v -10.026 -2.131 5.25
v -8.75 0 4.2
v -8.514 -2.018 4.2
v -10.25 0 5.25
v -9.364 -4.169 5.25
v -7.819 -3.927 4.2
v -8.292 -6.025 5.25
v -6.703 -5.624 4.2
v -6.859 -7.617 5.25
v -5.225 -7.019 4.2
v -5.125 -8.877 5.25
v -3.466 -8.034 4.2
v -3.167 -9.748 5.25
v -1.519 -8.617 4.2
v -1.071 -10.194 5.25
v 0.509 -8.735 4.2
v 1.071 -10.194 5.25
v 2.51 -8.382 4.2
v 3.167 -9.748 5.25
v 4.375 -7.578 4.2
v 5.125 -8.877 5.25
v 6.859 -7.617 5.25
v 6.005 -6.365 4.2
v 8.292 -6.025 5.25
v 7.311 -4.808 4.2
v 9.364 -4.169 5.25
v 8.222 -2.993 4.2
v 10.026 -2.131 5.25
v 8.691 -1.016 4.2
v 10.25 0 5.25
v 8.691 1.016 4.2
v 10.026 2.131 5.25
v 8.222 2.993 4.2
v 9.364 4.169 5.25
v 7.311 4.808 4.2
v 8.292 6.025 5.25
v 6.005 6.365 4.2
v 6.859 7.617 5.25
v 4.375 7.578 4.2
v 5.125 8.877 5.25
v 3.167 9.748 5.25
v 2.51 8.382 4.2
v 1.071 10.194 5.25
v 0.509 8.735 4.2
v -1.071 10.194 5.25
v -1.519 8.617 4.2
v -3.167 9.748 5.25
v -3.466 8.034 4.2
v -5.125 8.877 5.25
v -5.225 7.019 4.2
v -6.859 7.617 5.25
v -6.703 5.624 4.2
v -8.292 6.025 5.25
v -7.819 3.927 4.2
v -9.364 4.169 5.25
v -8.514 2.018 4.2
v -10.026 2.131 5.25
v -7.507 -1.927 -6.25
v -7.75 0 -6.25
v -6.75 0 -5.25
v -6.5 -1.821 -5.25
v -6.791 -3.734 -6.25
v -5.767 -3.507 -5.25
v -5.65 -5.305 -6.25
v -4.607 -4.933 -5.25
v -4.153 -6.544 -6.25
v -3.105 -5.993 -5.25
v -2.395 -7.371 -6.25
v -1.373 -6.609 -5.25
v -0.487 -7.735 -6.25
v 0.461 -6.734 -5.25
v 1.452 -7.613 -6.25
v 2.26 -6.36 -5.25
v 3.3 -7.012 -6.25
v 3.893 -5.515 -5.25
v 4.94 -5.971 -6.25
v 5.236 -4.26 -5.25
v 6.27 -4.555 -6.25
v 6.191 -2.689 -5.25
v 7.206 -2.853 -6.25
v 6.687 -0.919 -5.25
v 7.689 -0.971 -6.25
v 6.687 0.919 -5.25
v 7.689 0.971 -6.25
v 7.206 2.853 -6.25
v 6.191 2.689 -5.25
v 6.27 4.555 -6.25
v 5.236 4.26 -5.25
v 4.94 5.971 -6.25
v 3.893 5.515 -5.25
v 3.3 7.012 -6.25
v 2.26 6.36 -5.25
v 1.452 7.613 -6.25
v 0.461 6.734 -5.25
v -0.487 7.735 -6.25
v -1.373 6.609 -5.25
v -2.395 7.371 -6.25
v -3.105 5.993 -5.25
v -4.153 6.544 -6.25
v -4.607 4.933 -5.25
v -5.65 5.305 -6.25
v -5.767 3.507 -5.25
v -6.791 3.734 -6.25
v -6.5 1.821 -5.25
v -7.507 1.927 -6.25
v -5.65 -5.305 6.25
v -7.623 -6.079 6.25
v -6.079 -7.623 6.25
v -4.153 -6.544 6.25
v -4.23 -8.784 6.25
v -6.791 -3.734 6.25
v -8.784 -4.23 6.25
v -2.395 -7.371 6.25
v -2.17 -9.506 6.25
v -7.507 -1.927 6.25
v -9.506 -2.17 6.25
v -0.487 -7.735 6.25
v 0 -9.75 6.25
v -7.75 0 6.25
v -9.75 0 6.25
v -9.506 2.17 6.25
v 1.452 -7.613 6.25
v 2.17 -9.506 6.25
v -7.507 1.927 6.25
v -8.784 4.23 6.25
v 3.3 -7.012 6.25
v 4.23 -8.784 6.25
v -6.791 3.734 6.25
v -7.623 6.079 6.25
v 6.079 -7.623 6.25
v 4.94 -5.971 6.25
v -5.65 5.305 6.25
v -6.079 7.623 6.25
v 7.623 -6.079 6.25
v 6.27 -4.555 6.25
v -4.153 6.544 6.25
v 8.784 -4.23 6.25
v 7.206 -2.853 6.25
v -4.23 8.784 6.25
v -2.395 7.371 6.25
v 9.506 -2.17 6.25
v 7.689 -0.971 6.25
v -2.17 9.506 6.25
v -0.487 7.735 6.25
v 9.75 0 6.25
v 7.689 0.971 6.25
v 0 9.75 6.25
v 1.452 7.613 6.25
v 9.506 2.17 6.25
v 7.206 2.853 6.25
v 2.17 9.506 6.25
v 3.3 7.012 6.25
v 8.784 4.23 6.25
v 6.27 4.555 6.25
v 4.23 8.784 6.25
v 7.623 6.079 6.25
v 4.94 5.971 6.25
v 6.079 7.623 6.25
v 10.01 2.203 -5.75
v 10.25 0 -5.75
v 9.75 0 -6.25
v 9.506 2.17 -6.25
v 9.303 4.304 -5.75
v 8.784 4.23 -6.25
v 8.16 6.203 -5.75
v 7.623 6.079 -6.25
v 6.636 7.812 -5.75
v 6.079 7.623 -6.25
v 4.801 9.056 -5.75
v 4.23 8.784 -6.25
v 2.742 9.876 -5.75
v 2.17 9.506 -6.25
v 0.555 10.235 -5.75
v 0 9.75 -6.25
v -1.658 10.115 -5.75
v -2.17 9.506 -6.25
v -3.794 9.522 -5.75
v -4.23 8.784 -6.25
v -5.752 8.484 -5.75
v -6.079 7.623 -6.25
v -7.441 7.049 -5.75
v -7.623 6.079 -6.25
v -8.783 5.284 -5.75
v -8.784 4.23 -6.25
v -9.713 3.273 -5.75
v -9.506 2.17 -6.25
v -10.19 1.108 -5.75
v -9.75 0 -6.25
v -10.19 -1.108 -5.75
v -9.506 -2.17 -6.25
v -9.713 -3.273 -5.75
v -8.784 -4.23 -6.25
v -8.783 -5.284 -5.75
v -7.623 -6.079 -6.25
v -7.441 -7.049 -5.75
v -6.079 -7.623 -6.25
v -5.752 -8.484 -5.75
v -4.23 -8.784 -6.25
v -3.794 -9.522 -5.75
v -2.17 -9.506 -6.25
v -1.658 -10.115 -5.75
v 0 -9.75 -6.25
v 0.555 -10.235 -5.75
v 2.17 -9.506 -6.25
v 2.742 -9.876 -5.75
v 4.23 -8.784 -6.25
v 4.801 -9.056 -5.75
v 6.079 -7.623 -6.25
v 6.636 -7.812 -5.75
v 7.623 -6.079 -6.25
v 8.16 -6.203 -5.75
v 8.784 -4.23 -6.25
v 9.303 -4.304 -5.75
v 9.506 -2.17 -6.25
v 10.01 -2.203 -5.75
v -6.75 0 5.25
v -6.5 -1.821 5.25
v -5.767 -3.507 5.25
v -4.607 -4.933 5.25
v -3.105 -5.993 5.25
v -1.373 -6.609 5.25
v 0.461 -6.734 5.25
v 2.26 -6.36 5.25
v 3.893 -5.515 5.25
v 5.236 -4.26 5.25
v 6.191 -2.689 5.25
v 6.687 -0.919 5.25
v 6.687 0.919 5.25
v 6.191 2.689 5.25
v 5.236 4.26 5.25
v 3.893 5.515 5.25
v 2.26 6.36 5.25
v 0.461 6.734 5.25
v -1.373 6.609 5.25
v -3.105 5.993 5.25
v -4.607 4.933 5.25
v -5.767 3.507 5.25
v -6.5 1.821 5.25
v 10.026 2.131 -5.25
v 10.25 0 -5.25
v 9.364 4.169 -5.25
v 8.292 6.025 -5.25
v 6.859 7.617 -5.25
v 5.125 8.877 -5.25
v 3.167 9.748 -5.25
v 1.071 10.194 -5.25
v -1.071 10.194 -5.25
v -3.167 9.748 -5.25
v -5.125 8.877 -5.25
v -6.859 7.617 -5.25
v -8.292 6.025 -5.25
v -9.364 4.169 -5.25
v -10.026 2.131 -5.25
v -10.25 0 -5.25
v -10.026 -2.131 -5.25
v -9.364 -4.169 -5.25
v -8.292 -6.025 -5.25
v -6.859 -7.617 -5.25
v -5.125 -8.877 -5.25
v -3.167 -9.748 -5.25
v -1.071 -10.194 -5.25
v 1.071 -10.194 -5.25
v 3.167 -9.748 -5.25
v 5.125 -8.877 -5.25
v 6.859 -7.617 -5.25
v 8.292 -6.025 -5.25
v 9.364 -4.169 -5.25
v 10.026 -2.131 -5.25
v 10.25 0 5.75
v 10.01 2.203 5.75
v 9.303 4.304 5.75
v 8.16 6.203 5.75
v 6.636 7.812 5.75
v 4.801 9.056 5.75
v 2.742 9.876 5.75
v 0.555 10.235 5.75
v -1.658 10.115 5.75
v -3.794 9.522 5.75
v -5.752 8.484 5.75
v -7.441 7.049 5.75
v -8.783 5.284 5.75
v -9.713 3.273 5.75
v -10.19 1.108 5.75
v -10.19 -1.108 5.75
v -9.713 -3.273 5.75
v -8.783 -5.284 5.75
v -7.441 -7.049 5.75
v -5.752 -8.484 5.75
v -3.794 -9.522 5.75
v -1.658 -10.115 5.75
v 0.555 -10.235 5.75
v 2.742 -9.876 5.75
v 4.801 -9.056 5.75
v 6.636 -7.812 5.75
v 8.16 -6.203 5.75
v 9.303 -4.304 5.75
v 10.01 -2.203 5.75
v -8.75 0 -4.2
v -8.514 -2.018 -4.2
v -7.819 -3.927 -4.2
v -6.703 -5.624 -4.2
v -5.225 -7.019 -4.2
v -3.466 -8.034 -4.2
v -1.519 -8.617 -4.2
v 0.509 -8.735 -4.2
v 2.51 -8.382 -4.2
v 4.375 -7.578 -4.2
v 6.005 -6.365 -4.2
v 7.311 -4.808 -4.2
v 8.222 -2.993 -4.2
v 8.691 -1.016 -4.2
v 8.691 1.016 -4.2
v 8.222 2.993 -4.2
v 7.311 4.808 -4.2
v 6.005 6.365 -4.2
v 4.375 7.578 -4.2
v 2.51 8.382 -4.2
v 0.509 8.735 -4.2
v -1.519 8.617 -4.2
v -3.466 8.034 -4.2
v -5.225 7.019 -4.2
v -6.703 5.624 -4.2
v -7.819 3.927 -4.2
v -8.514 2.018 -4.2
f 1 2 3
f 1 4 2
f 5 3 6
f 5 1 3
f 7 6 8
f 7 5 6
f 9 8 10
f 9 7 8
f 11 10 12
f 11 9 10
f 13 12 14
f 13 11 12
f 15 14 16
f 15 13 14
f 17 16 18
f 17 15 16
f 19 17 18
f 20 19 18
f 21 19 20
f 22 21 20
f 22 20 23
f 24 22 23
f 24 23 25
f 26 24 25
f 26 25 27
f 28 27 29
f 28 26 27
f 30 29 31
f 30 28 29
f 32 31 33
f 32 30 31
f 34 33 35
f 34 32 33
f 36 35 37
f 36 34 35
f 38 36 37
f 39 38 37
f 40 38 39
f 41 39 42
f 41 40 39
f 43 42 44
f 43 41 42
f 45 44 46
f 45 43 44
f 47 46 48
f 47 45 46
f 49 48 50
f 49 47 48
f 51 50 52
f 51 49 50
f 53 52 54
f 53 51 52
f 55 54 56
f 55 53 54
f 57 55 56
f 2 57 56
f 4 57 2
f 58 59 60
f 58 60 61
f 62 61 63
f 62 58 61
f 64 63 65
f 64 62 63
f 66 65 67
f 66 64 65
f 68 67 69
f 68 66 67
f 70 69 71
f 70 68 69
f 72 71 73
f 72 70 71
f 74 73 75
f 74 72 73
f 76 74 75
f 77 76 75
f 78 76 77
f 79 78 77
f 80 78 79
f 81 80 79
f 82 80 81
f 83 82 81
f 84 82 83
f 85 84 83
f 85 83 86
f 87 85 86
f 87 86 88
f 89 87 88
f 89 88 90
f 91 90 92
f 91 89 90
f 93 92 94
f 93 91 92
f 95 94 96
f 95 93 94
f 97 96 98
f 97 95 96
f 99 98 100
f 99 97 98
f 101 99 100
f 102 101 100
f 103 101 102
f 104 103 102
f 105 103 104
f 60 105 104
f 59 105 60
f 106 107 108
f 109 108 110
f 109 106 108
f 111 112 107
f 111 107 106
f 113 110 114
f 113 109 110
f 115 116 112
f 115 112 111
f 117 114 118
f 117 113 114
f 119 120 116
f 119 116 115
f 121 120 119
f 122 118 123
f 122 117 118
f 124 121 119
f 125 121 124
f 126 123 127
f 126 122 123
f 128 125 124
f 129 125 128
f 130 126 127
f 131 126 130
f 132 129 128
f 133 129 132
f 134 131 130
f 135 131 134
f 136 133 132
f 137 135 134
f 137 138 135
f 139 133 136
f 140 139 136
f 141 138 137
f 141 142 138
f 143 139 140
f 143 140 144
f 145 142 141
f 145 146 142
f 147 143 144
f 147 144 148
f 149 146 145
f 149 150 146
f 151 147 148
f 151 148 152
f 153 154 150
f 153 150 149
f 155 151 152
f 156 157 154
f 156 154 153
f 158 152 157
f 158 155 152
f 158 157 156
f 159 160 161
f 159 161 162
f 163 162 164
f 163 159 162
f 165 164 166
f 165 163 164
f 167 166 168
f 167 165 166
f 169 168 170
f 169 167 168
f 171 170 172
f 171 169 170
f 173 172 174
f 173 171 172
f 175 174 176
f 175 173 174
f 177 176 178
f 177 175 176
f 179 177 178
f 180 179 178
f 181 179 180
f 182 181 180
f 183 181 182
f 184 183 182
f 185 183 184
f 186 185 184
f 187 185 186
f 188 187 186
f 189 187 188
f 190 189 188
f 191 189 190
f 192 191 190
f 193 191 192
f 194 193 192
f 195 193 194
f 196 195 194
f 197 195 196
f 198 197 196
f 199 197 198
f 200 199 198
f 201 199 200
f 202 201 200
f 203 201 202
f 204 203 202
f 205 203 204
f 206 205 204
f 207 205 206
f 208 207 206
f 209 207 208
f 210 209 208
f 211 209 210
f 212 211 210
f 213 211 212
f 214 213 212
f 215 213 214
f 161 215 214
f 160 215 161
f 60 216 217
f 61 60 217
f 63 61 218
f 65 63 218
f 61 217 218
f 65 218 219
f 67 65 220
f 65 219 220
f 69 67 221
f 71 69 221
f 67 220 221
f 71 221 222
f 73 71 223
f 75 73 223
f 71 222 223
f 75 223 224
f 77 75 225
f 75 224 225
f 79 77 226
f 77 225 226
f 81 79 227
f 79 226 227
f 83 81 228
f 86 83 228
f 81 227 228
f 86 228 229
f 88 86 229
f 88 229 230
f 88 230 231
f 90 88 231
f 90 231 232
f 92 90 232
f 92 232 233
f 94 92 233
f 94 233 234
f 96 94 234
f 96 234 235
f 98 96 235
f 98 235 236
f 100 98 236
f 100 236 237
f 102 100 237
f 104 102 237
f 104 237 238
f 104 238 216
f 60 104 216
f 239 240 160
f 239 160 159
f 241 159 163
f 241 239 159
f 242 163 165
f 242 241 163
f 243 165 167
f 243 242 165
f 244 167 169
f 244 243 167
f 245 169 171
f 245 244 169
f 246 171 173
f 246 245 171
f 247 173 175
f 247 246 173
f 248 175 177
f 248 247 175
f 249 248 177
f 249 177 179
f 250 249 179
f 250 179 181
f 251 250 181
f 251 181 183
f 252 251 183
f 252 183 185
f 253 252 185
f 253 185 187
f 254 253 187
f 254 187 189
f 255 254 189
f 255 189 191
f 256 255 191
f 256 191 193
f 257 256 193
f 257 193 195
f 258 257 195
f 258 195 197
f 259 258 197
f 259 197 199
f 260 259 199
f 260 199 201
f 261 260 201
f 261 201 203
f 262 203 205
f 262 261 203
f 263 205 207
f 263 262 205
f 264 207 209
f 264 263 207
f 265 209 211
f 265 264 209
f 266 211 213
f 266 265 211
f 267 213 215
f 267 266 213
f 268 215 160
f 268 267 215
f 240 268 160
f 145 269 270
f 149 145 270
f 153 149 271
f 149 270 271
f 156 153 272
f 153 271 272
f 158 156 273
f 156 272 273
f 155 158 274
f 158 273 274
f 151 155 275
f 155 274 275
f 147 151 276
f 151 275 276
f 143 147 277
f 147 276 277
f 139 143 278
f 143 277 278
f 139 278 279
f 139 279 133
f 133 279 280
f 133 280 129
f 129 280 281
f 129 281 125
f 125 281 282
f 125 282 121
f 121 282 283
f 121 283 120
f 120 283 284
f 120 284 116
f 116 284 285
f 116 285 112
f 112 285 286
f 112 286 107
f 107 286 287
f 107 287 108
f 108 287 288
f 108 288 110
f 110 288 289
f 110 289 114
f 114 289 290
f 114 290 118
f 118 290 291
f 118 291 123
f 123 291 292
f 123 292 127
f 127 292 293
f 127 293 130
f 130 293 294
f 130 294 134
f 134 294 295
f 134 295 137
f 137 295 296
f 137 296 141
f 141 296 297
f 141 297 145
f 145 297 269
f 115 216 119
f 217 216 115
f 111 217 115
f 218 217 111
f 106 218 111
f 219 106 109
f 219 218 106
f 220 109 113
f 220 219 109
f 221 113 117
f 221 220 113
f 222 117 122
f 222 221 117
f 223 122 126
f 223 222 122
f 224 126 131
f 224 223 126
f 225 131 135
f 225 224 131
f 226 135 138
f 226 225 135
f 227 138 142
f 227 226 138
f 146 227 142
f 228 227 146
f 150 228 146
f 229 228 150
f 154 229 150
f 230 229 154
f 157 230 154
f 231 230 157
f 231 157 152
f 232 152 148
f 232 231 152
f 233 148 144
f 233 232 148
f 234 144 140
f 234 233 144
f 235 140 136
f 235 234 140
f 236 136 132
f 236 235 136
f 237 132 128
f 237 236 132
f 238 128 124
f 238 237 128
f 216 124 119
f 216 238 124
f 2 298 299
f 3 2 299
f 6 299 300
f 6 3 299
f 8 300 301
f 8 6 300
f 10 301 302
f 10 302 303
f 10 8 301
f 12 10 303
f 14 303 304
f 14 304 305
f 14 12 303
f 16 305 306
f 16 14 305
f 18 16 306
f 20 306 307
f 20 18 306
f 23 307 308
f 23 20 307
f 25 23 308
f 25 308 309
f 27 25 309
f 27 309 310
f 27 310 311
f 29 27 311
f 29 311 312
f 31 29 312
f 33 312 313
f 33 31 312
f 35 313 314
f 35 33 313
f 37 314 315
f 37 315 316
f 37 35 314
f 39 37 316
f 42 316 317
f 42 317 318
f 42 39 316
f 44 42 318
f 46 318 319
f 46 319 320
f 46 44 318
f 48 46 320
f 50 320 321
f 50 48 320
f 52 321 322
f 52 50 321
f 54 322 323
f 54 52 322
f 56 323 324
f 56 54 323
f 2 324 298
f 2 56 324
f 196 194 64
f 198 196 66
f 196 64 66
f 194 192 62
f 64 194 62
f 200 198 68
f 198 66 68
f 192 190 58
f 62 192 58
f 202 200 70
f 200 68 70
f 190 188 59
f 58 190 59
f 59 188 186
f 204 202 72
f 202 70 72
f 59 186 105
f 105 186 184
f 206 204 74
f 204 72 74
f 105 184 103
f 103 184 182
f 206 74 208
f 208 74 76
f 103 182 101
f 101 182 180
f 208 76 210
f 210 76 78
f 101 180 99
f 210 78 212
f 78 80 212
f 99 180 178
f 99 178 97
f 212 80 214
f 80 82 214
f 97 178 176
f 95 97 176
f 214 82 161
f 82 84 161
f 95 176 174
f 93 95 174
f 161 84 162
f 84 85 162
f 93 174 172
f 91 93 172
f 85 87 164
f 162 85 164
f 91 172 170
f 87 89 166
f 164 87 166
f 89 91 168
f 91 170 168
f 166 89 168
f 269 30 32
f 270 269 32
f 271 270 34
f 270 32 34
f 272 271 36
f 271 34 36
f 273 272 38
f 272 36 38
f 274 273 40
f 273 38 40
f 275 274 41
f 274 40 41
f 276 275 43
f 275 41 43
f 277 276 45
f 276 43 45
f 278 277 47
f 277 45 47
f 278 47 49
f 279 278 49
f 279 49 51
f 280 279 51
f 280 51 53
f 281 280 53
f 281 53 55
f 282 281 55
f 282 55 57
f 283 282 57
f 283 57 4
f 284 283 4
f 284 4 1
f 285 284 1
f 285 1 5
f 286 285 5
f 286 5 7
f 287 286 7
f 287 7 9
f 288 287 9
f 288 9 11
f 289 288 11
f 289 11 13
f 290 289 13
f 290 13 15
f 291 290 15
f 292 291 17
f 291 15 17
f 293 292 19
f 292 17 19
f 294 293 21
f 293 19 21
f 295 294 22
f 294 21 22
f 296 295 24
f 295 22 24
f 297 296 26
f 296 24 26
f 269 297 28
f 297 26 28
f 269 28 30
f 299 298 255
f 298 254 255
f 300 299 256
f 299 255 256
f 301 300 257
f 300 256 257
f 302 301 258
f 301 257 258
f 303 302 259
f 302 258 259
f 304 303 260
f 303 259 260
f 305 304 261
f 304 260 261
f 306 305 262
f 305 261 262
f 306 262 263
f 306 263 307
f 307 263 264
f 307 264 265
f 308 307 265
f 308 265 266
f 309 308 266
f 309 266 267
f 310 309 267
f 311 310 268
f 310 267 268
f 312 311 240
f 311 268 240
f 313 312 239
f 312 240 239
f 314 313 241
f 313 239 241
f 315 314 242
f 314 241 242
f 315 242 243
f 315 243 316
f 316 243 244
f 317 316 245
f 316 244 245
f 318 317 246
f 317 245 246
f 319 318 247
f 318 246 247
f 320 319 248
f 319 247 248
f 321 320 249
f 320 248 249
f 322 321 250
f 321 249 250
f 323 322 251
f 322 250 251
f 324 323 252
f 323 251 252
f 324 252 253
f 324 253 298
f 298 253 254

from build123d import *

# Parameters (mm, degrees)
SKETCH1_R           = 8.75
SKETCH1_R_2         = 6.75
BOSS_EXTRUDE1_DEPTH = 5.25
SKETCH2_R           = 10.25
SKETCH2_R_2         = 6.75
BOSS_EXTRUDE2_DEPTH = 1
CHAMFER1_SIZE       = 1.050311307
CHAMFER1_SIZE_2     = 1.5
CHAMFER2_SIZE       = 1
CHAMFER3_SIZE       = 0.5


with BuildPart() as part:
    # Sketch1 → Boss-Extrude1 (new, symmetric)
    with BuildSketch(Plane.XY):
        with Locations(Location((0, 0, 0), (0, 0, 180))):
            Circle(SKETCH1_R)
        with Locations(Location((0, 0, 0), (0, 0, 180))):
            Circle(SKETCH1_R_2, mode=Mode.SUBTRACT)
    extrude(amount=BOSS_EXTRUDE1_DEPTH, both=True)

    # Sketch2 → Boss-Extrude2 (add)
    with BuildSketch(Plane.XY.offset(5.25)):
        Circle(SKETCH2_R)
        with Locations(Location((0, 0, 0), (0, 0, 180))):
            Circle(SKETCH2_R_2, mode=Mode.SUBTRACT)
    boss_extrude2 = extrude(amount=BOSS_EXTRUDE2_DEPTH)

    # Mirror1: Boss-Extrude2 across plane
    add(boss_extrude2.mirror(Plane.XY))

    # Chamfer1
    # the kernel refuses this chamfer: 1.5, 1.050311307 mm, written as the material it adds along each edge
    with BuildSketch(Plane(origin=(0, 0, -5.25), x_dir=(-1, 0, 0), z_dir=(0, 1, 0))) as chamfer1_piece_1_section:
        Polygon((8.75, CHAMFER1_SIZE), (8.75 + CHAMFER1_SIZE_2, 0), (8.75, 0), align=None)
    chamfer1_piece_1 = revolve(axis=Axis((0, 0, -5.25), (0, 0, 1)), mode=Mode.PRIVATE)
    chamfer1_piece_1 = chamfer1_piece_1 & Plane(origin=(0, 0, -4.738052243), x_dir=(1, 0, 0), z_dir=(0, 0, 1)) * Cylinder(10.25, 42, mode=Mode.PRIVATE)
    add(chamfer1_piece_1)
    with BuildSketch(Plane(origin=(0, 0, 5.25), x_dir=(-1, 0, 0), z_dir=(0, 1, 0))) as chamfer1_piece_2_section:
        Polygon((8.75, -CHAMFER1_SIZE), (8.75 + CHAMFER1_SIZE_2, 0), (8.75, 0), align=None)
    chamfer1_piece_2 = revolve(axis=Axis((0, 0, 5.25), (0, 0, 1)), mode=Mode.PRIVATE)
    chamfer1_piece_2 = chamfer1_piece_2 & Plane(origin=(0, 0, 4.738052243), x_dir=(1, 0, 0), z_dir=(0, 0, -1)) * Cylinder(10.25, 42, mode=Mode.PRIVATE)
    add(chamfer1_piece_2)

    # Chamfer2
    chamfer2_edges = [part.edges().sort_by_distance(p)[0] for p in [
        (6.75, 0, 6.25),
        (6.75, 0, -6.25),
    ]]
    chamfer(chamfer2_edges, length=CHAMFER2_SIZE)

    # Chamfer3
    chamfer3_edges = [part.edges().sort_by_distance(p)[0] for p in [
        (-10.25, 0, 6.25),
        (-10.25, 0, -6.25),
    ]]
    chamfer(chamfer3_edges, length=CHAMFER3_SIZE)


solid = part.part
